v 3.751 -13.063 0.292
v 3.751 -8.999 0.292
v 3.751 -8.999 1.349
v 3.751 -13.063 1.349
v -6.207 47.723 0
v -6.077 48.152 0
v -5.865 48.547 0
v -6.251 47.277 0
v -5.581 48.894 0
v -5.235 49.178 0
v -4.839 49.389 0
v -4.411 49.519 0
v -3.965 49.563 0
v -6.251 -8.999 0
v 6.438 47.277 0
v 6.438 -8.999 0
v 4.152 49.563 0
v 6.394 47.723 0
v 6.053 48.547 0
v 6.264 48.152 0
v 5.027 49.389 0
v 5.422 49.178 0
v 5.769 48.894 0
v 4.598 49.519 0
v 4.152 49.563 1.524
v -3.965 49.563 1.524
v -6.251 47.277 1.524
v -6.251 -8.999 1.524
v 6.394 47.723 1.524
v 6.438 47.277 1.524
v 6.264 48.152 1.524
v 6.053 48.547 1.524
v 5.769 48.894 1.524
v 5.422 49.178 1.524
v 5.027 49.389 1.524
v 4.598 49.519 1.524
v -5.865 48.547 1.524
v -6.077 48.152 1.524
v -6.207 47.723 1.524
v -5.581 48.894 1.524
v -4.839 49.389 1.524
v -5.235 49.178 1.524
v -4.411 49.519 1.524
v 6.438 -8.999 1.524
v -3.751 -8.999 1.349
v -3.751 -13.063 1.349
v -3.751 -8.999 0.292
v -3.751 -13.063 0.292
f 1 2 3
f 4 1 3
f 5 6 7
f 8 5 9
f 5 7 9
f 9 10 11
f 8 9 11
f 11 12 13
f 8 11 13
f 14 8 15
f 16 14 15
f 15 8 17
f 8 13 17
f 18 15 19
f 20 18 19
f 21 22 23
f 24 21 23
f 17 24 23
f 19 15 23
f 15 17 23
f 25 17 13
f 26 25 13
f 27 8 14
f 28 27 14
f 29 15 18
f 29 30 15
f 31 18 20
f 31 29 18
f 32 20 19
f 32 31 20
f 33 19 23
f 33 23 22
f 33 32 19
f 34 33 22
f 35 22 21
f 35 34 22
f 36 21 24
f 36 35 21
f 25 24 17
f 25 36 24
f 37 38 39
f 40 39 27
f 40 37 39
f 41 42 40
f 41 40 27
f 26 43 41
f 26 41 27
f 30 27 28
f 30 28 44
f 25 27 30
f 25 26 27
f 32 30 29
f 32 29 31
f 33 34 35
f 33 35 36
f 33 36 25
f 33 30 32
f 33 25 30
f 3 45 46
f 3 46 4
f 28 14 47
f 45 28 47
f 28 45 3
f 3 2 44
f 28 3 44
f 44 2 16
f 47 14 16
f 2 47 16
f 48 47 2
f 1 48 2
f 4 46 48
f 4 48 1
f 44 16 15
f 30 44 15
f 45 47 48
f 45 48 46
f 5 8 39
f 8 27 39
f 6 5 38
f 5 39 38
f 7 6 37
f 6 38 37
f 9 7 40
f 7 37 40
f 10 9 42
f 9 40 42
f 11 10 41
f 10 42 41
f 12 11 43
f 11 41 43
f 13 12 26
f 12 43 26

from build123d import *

# Parameters (mm, degrees)
F1_DEPTH = 1.524
F2_R     = 2.286
F3_W     = 7.501836
F3_H     = 1.057486
F4_DEPTH = 4.064


with BuildPart() as f1:
    # F0 (on Top) → F1 (new body)
    with BuildSketch(Plane.XY):
        Polygon((-6.250669, 49.563318), (-6.250669, -8.998585), (-4.305575, -8.998585), (4.510465, -8.998585), (6.438088, -8.998585), (6.438088, 49.563318), align=None)
    extrude(amount=F1_DEPTH)

    # F2
    f2_edges = [f1.edges().sort_by_distance(p)[0] for p in [
        (-6.250669, 49.563318, 0.762),
        (6.438088, 49.563318, 0.762),
    ]]
    fillet(f2_edges, radius=F2_R)

    # F3 (on face) → F4 (join)
    with BuildSketch(Plane.XZ.offset(8.998585)):
        with Locations((0, 0.820748)):
            Rectangle(F3_W, F3_H)
    extrude(amount=F4_DEPTH)


solid = f1.part
